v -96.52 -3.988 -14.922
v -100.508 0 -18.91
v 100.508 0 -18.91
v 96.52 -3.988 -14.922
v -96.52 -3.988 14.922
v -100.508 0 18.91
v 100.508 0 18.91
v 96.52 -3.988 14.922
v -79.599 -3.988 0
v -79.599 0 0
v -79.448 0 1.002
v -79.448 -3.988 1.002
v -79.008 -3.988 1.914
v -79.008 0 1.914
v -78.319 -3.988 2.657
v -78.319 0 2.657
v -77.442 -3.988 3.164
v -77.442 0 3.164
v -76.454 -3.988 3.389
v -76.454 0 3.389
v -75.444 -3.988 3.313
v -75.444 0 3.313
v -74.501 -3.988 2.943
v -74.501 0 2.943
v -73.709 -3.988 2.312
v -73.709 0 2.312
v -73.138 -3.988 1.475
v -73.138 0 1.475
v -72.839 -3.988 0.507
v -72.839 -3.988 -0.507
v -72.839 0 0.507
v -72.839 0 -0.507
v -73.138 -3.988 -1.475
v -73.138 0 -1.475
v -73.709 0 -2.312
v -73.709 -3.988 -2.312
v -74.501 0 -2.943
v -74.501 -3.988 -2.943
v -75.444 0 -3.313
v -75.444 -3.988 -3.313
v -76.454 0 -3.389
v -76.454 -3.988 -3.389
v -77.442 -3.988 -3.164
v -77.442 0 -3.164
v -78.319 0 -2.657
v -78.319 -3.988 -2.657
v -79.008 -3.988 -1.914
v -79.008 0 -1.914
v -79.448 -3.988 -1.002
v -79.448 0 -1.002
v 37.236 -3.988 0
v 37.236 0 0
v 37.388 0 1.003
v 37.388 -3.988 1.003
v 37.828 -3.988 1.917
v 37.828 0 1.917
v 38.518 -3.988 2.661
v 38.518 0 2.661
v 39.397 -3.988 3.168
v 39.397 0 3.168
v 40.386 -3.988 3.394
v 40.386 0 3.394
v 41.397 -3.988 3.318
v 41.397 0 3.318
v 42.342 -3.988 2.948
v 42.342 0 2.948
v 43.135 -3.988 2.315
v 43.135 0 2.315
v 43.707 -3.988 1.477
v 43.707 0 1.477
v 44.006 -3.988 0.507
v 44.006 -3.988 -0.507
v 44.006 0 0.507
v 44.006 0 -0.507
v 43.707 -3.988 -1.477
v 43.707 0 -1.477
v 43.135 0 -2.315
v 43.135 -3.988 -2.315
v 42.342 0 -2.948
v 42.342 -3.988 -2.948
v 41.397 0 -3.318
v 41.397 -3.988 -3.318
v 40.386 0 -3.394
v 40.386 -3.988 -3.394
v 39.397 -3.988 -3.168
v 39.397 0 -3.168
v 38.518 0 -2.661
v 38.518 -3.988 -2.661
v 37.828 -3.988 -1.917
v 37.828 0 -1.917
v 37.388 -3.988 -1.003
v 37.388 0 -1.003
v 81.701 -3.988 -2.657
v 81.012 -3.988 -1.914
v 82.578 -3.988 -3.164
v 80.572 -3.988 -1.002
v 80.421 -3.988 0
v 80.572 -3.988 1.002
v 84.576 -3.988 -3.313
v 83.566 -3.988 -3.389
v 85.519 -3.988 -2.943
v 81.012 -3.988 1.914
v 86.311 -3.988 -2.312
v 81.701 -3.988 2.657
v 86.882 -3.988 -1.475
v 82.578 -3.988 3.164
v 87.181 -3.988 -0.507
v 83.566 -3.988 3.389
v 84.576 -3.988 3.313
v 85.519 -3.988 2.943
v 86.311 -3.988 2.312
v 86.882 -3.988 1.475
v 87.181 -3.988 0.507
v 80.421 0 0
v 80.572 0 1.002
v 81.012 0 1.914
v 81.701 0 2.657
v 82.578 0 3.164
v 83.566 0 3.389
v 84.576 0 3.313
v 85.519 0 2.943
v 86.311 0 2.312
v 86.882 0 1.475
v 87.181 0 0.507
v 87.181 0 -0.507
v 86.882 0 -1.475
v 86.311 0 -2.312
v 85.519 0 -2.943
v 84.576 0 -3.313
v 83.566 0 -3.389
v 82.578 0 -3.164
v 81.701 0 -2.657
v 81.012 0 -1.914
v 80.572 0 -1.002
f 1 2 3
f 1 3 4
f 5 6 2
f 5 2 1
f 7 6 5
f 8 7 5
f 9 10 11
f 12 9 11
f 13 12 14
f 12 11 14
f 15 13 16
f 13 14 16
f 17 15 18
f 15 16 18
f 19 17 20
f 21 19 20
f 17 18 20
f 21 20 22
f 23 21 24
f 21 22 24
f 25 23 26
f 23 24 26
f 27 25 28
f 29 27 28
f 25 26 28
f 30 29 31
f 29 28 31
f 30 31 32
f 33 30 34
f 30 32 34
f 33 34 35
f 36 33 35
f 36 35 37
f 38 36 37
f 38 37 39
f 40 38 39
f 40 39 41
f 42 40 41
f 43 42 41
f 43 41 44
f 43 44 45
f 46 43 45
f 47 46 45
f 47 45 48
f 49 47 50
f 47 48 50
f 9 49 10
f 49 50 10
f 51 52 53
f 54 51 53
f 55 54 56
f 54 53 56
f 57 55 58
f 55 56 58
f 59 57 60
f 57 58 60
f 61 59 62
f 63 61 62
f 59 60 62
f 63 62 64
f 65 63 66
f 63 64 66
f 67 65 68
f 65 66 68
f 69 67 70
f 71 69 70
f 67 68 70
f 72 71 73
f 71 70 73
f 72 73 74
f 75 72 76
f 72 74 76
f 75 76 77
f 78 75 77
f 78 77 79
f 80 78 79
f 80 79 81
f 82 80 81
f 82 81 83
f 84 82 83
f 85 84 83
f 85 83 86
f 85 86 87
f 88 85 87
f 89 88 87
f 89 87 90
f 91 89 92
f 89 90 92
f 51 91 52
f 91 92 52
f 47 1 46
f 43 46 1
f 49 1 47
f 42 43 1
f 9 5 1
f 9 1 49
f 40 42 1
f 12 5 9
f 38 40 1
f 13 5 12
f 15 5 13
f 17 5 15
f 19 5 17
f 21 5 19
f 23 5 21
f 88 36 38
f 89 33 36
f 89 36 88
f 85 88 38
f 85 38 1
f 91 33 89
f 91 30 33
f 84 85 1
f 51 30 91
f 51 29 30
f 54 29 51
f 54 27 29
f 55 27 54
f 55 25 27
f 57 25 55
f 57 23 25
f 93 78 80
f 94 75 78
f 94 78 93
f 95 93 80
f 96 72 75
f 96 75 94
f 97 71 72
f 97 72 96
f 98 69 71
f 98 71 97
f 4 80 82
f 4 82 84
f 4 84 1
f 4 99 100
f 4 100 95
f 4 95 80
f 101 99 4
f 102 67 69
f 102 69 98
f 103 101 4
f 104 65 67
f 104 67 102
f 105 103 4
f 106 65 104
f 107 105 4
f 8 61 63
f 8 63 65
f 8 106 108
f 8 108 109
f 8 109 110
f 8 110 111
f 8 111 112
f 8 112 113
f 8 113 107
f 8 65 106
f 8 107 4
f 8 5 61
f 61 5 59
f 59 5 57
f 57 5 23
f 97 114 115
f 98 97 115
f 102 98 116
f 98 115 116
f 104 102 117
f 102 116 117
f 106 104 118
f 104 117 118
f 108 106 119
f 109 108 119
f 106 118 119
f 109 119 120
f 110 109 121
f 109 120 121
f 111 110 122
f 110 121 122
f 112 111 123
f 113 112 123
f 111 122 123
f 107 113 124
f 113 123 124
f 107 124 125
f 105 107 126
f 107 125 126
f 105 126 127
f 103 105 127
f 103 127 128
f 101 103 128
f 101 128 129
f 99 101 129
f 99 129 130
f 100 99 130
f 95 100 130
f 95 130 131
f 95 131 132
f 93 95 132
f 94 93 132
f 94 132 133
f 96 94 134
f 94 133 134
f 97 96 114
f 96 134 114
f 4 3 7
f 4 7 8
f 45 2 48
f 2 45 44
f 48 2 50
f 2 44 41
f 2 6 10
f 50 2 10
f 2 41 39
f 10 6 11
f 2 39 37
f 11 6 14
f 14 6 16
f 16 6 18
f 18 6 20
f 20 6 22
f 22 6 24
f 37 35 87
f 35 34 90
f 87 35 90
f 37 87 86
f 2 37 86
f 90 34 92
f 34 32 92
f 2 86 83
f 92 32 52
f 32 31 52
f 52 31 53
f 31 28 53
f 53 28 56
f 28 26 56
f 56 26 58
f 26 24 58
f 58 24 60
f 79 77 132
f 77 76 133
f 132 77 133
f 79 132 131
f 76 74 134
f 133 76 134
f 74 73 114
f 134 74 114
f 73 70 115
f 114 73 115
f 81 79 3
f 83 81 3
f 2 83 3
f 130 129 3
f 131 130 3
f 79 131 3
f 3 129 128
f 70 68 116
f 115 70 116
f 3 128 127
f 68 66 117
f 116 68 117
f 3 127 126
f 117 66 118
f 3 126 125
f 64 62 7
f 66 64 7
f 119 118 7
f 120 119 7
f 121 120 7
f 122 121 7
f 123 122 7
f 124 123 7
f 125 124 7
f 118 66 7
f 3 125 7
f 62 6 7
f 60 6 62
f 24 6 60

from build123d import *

# Parameters (mm, degrees)
F1_DEPTH    = 3.9878
F2_T1_DEPTH = 229.3282991577
F2_T3_DEPTH = 66.1332991577


# Not quite as in the source:
# - a fillet or chamfer that OpenCascade refuses, or shapes differently, is made with other operations: its cross-section is extruded or revolved along the edge and cut away or added


with BuildPart() as f1:
    # F0 (on Front) → F1 (new body)
    with BuildSketch(Plane.XZ):
        with BuildLine():
            Line((0, -20.0025), (101.6, -20.0025))
            Line((101.6, -20.0025), (101.6, 0))
            Line((101.6, 0), (87.21852, 0))
            ThreePointArc((87.21852, 0), (83.82, -3.39852), (80.42148, 0))
            Line((80.42148, 0), (44.0436, 0))
            ThreePointArc((44.0436, 0), (40.64, -3.4036), (37.2364, 0))
            Line((37.2364, 0), (0, 0))
            Line((0, 0), (0, -20.0025))
        make_face()
        Polygon((-101.6, -20.0025), (0, -20.0025), (0, 0), (0, 20.0025), (-101.6, 20.0025), (-101.6, 0), align=None)
        with BuildLine():
            ThreePointArc((-72.80148, 0), (-76.2, -3.39852), (-79.59852, 0))
            ThreePointArc((-79.59852, 0), (-76.2, 3.39852), (-72.80148, 0))
        make_face(mode=Mode.SUBTRACT)
        with BuildLine():
            Line((87.21852, 0), (101.6, 0))
            Line((101.6, 0), (101.6, 20.0025))
            Line((101.6, 20.0025), (0, 20.0025))
            Line((0, 20.0025), (0, 0))
            Line((0, 0), (37.2364, 0))
            ThreePointArc((37.2364, 0), (40.64, 3.4036), (44.0436, 0))
            Line((44.0436, 0), (80.42148, 0))
            ThreePointArc((80.42148, 0), (83.82, 3.39852), (87.21852, 0))
        make_face()
    extrude(amount=F1_DEPTH)

    # F2: chamfer of 5.08 on 4 edges, made by hand

    # F2_s2 → F2_t1 (cut)
    with BuildSketch(Plane.YZ.offset(-114.6641495789)):
        Polygon((1.0922, 20.0025), (-3.9878, 14.9225), (-3.9878, 20.0025), align=None)
        Polygon((1.0922, -20.0025), (-3.9878, -14.9225), (-3.9878, -20.0025), align=None)
    extrude(amount=F2_T1_DEPTH, mode=Mode.SUBTRACT)

    # F2_s4 → F2_t3 (cut)
    with BuildSketch(Plane.XY.offset(-33.0666495789)):
        Polygon((-101.6, 1.0922), (-96.52, -3.9878), (-101.6, -3.9878), align=None)
        Polygon((101.6, 1.0922), (96.52, -3.9878), (101.6, -3.9878), align=None)
    extrude(amount=F2_T3_DEPTH, mode=Mode.SUBTRACT)


solid = f1.part
